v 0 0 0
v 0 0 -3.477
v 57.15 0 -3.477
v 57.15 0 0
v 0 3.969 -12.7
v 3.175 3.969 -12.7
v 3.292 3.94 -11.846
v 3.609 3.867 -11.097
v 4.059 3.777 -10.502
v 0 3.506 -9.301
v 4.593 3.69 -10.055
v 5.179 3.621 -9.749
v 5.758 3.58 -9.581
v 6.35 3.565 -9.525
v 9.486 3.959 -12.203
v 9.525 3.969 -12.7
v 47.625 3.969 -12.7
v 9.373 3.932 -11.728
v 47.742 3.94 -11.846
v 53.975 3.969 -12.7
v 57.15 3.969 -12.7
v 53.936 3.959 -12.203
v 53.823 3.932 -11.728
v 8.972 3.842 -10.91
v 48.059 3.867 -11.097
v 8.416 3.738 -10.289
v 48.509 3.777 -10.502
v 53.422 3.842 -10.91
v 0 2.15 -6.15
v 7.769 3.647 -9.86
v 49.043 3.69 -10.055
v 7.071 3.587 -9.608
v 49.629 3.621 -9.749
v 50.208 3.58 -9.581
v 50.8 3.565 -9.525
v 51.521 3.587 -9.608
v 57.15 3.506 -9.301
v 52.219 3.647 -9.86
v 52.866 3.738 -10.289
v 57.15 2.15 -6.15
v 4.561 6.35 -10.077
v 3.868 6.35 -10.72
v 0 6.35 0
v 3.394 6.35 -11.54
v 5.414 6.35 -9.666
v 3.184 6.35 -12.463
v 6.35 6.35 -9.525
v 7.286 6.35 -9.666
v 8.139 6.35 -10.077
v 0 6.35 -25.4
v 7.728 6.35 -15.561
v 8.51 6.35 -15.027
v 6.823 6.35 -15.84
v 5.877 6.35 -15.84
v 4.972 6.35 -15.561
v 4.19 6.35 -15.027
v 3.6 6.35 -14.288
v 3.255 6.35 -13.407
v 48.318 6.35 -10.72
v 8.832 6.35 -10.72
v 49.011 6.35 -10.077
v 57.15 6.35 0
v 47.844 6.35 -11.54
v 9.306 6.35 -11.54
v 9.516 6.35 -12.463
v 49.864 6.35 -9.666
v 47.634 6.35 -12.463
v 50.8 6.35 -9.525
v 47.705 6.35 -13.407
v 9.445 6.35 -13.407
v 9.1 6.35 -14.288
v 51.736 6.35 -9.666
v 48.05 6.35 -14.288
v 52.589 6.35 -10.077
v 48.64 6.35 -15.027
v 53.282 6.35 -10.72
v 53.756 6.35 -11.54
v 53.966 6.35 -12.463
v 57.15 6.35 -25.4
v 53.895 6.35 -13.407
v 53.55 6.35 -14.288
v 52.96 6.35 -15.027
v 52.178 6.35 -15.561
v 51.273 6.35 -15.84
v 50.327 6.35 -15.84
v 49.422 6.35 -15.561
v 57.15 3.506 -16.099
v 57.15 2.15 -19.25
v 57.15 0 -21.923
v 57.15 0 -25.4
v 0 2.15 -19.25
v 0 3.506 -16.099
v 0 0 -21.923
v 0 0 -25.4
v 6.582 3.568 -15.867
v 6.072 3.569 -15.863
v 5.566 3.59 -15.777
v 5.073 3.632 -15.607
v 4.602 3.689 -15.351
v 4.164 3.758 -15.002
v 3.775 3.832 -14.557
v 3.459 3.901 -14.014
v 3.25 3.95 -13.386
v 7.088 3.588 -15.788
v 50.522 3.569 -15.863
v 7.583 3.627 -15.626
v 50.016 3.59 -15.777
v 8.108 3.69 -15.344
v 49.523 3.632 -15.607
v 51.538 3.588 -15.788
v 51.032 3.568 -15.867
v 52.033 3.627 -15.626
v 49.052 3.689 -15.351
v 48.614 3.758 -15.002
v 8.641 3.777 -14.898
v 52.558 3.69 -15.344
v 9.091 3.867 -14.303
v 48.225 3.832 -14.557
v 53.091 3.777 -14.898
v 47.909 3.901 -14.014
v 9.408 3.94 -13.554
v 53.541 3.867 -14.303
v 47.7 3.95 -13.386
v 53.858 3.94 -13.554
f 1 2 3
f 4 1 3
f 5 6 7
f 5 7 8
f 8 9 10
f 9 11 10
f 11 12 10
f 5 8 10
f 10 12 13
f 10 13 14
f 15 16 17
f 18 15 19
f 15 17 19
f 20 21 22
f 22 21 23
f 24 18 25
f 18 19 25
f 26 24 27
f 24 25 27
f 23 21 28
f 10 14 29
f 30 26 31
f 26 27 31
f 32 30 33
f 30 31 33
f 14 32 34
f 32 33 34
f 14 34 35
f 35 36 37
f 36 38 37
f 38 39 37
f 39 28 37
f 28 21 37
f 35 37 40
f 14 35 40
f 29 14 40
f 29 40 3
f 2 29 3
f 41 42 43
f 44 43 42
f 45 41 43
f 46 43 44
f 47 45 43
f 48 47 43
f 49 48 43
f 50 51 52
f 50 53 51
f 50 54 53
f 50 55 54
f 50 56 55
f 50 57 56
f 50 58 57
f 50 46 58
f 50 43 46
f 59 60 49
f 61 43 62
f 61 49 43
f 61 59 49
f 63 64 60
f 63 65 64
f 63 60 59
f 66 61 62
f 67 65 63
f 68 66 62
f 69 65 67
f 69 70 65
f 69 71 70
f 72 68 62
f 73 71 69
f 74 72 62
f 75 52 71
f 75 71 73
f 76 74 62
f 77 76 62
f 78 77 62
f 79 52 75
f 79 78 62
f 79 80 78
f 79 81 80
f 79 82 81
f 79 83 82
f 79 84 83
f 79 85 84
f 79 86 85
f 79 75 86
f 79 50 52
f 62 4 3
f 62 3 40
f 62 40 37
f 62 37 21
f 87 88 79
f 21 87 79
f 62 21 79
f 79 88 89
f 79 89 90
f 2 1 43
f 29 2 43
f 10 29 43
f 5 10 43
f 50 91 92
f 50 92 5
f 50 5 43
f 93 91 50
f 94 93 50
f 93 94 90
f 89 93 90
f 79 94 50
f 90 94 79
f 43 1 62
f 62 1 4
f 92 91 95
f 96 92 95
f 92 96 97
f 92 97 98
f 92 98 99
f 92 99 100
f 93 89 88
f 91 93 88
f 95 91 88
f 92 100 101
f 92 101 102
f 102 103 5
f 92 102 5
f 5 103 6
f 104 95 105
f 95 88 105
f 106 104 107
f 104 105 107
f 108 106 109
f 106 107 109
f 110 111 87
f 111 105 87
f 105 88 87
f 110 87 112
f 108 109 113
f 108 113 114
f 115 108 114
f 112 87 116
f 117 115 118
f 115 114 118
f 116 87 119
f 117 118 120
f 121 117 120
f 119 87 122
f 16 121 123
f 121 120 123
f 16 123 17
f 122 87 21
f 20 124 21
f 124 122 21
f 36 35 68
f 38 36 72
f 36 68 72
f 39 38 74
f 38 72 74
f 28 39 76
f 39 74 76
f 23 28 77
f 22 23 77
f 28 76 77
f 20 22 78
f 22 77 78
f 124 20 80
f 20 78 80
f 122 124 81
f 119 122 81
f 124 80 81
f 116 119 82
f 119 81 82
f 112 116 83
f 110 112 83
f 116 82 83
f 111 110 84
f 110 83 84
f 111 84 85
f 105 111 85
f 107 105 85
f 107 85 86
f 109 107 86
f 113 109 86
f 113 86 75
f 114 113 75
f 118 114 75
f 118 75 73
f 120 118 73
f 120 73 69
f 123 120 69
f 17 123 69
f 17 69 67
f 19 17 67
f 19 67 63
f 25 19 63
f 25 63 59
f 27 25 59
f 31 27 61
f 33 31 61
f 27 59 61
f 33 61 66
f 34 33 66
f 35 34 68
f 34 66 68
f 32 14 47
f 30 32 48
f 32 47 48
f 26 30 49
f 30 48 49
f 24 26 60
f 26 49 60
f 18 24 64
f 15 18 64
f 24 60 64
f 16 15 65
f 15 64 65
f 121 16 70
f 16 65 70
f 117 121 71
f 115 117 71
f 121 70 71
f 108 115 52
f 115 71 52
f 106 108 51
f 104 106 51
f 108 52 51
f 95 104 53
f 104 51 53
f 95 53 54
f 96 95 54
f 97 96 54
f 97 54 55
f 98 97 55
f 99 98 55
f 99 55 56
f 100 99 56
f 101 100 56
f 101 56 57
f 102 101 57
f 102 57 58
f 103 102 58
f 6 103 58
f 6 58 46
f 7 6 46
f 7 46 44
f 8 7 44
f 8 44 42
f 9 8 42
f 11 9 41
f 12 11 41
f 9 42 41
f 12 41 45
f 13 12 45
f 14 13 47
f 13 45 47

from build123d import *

# Parameters (mm, degrees)
SKETCH1_W           = 57.15
SKETCH1_H           = 25.4
BOSS_EXTRUDE1_DEPTH = 6.35
CUT_EXTRUDE1_DEPTH  = 635
SKETCH3_R           = 3.175
CUT_EXTRUDE2_DEPTH  = 6.35


with BuildPart() as part:
    # Sketch1 → Boss-Extrude1 (new body)
    with BuildSketch(Plane(origin=(0, 0, 0), x_dir=(1, 0, 0), z_dir=(0, 1, 0))):
        with Locations((28.575, 12.7)):
            Rectangle(SKETCH1_W, SKETCH1_H)
    extrude(amount=BOSS_EXTRUDE1_DEPTH)

    # Sketch2 → Cut-Extrude1 (cut)
    with BuildSketch(Plane(origin=(57.15, 0, 0), x_dir=(0, 0, -1), z_dir=(1, 0, 0))):
        with BuildLine():
            ThreePointArc((21.922541593, 0), (12.7, 3.96875), (3.477458407, 0))
            Line((3.477458407, 0), (21.922541593, 0))
        make_face()
    extrude(amount=-CUT_EXTRUDE1_DEPTH, mode=Mode.SUBTRACT)

    # Sketch3 → Cut-Extrude2 (cut)
    with BuildSketch(Plane(origin=(0, 6.35, 0), x_dir=(1, 0, 0), z_dir=(0, 1, 0))):
        with Locations((6.35, 12.7)):
            Circle(SKETCH3_R)
        with Locations((50.8, 12.7)):
            Circle(SKETCH3_R)
    extrude(amount=-CUT_EXTRUDE2_DEPTH, mode=Mode.SUBTRACT)


solid = part.part
